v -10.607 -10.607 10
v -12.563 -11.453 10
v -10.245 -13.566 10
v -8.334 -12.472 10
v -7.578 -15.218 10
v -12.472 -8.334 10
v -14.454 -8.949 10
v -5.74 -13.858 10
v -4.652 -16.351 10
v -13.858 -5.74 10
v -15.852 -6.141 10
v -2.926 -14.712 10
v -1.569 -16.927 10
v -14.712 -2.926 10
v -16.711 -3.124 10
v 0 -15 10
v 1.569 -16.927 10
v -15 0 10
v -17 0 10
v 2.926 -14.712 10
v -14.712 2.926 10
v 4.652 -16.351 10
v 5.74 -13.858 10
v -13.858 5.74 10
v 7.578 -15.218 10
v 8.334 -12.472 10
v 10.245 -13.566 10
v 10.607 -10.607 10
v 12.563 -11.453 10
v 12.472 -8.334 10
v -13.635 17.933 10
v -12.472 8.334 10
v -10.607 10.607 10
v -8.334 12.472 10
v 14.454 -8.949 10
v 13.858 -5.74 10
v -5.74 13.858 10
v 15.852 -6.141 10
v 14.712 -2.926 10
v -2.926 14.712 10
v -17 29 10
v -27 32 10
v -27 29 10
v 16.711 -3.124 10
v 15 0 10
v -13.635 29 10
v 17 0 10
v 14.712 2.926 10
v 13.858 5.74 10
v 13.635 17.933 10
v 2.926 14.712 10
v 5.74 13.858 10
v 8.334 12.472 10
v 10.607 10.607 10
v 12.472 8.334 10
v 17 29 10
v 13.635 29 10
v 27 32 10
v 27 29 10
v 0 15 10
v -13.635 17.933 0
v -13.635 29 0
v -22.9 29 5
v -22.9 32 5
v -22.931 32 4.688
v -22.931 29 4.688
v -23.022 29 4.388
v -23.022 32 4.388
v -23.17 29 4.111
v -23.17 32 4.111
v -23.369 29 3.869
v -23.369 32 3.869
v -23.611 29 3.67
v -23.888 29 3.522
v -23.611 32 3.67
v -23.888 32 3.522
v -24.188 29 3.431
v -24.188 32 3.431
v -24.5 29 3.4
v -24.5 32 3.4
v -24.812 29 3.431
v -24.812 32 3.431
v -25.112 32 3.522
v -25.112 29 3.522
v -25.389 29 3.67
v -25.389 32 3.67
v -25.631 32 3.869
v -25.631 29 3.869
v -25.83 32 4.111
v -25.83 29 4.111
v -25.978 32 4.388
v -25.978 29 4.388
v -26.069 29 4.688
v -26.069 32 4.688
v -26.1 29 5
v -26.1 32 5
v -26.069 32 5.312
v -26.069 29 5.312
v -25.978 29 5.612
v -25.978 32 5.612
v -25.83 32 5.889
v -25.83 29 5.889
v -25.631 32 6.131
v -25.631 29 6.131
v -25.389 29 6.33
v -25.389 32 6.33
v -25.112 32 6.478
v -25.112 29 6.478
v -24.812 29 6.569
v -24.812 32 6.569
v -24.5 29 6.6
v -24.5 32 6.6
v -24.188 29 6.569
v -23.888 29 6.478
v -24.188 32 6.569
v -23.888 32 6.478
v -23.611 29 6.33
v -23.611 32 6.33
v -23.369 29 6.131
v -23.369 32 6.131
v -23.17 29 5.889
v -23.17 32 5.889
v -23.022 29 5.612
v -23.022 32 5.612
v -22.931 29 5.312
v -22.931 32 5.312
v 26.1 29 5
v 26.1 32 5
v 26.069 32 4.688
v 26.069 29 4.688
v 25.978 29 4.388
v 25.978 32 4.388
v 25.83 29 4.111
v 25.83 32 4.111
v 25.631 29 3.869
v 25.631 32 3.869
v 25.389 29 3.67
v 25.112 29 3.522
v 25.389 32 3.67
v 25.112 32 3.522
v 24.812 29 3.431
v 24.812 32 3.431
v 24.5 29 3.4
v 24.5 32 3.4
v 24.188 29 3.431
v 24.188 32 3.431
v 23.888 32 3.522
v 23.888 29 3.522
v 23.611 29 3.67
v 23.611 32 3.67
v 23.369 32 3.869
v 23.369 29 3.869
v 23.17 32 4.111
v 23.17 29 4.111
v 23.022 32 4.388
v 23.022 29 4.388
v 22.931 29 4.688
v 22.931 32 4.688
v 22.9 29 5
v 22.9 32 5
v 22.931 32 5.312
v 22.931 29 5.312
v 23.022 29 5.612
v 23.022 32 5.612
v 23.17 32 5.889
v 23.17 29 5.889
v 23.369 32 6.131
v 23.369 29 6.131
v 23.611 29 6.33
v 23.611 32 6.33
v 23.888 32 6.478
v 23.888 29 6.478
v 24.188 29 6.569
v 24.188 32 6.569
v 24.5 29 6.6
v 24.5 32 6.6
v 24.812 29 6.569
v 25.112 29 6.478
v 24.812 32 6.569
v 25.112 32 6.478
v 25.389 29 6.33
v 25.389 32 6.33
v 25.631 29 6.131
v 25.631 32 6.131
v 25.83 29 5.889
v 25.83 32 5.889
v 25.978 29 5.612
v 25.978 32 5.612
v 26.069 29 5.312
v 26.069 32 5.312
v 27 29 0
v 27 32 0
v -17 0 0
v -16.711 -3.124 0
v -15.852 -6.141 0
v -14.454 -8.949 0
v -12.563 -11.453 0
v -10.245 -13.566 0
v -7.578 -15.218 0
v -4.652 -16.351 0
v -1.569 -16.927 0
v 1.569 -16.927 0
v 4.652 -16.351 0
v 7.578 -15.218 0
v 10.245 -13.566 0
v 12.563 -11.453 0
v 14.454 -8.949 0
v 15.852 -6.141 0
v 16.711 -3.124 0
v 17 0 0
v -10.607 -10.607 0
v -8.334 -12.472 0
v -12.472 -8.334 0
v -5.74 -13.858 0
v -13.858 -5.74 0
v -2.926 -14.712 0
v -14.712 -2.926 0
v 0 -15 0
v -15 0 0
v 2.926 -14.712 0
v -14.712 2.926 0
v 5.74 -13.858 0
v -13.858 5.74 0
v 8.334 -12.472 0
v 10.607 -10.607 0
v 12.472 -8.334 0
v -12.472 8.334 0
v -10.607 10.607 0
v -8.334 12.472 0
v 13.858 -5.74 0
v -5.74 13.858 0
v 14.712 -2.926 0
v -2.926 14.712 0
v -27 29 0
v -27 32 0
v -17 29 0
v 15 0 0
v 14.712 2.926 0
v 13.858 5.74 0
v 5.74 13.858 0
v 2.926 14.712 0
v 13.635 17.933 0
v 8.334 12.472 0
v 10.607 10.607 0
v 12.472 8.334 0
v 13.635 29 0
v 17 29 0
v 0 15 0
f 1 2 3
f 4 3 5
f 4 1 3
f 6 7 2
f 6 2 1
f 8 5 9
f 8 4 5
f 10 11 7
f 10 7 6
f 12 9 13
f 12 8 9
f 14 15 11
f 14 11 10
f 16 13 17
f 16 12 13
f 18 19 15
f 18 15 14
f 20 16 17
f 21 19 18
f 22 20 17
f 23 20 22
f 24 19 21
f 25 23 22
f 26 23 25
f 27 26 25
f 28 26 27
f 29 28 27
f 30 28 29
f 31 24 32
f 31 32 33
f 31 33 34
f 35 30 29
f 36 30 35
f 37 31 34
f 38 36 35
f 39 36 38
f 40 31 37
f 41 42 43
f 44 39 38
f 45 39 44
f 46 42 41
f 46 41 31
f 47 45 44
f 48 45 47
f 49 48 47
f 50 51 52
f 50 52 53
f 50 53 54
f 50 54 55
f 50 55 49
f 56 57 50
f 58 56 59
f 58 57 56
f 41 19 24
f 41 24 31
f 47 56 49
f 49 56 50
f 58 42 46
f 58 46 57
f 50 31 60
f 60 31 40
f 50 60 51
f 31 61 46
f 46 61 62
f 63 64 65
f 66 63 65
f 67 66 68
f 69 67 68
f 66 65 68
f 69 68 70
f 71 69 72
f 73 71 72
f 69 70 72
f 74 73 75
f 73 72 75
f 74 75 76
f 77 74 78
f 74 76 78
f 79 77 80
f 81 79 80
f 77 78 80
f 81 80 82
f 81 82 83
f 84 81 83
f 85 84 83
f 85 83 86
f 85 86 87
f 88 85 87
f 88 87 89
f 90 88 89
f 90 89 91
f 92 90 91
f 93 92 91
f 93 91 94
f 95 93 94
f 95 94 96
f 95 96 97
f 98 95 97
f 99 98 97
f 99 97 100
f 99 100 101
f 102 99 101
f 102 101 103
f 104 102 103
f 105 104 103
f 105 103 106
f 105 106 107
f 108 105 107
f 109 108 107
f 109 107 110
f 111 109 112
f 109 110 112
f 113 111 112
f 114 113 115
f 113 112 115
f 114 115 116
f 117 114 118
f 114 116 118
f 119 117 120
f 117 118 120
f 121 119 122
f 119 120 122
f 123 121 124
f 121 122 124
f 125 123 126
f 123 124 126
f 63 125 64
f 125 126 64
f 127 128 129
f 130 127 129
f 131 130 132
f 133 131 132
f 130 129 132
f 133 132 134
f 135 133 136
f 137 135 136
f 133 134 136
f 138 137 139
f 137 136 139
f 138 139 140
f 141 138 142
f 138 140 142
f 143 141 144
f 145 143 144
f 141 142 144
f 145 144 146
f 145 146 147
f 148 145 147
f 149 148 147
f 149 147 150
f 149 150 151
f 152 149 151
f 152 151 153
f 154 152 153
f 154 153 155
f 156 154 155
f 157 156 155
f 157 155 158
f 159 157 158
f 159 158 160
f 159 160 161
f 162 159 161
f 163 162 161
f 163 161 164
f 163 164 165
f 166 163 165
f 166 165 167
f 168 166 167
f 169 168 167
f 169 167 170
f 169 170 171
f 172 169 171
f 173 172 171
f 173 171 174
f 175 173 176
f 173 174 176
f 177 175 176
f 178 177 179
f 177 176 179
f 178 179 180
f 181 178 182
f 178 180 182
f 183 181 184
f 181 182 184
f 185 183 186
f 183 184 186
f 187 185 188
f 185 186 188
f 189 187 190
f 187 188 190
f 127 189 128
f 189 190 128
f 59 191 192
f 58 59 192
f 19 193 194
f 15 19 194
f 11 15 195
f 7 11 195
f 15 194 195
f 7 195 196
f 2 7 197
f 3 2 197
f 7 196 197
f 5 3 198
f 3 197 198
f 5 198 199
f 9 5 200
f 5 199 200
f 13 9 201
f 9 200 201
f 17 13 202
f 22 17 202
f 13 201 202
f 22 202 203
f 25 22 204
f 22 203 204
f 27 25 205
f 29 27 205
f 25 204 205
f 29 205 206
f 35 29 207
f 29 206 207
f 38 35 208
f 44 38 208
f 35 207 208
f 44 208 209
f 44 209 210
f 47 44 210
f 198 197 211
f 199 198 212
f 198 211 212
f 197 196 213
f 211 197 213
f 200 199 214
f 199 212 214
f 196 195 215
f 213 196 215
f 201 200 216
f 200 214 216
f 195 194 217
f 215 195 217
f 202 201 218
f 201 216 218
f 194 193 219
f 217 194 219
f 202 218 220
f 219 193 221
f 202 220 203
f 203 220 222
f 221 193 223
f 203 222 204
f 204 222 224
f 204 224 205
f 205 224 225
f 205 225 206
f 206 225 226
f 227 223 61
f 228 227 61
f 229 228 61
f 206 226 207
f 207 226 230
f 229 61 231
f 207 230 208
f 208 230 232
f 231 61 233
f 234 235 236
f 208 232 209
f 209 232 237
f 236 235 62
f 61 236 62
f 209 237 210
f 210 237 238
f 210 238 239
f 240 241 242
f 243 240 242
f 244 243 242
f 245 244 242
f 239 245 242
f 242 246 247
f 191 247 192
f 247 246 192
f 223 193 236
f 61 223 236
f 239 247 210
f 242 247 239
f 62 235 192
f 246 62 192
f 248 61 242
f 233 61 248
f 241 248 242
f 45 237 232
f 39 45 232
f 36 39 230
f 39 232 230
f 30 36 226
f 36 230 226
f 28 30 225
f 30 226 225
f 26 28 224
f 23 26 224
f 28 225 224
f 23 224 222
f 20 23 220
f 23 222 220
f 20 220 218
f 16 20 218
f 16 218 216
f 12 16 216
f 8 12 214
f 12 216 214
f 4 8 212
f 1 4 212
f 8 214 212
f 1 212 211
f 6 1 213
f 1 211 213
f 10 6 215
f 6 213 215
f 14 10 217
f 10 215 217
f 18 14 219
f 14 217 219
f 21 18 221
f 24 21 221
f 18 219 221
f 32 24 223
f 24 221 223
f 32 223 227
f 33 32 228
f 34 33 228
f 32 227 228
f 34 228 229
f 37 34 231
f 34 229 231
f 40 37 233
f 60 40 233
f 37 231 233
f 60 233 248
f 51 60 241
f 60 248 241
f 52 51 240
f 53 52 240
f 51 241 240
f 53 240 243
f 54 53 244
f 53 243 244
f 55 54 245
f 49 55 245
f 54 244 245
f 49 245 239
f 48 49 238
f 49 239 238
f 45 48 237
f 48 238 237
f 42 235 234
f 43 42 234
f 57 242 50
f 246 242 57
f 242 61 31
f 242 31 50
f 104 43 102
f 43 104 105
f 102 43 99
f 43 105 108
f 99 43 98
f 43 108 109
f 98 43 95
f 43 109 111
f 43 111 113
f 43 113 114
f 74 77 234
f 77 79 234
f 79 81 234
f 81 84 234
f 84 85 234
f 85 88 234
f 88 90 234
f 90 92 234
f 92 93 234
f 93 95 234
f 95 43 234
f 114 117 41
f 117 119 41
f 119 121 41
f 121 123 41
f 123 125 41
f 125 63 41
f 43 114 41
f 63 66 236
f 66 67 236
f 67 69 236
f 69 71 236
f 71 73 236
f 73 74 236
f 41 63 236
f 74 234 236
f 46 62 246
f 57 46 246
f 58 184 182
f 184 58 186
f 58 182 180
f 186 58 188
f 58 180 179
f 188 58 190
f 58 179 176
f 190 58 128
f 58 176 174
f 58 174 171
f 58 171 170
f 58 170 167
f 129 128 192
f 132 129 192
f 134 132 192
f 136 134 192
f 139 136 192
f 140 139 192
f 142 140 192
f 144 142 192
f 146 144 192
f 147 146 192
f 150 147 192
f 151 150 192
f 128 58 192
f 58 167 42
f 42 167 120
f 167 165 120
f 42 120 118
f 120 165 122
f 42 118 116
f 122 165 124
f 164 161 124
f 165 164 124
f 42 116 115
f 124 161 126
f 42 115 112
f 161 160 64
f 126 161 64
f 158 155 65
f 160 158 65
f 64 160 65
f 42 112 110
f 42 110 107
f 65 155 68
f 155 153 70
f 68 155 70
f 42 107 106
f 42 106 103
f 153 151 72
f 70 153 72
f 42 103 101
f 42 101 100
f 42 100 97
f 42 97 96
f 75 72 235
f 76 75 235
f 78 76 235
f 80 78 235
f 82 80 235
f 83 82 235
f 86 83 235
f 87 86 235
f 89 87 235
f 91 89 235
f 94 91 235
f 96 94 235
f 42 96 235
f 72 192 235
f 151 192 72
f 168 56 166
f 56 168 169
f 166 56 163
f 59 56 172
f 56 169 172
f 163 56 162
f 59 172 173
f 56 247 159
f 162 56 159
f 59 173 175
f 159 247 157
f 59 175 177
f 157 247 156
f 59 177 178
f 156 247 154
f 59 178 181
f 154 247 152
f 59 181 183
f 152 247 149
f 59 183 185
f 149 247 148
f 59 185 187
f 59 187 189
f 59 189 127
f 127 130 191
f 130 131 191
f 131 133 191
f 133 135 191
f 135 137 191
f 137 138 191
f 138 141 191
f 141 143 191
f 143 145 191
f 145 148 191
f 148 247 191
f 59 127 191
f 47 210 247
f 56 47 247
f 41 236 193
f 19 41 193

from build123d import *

# Parameters (mm, degrees)
F0_W     = 27.270341292
F0_H     = 11.066971153
F1_DEPTH = 10
F3_DEPTH = 49.001


with BuildPart() as f1:
    # F0 (on Top) → F1 (new body)
    with BuildSketch(Plane.XY):
        with BuildLine():
            ThreePointArc((-17, 0), (0, 17), (17, 0))
            Line((17, 0), (17, 29))
            Line((17, 29), (27, 29))
            Line((27, 29), (27, 32))
            Line((27, 32), (17, 32))
            Line((17, 32), (-17, 32))
            Line((-17, 32), (-27, 32))
            Line((-27, 32), (-27, 29))
            Line((-27, 29), (-17, 29))
            Line((-17, 29), (-17, 0))
        make_face()
        with Locations((0, 23.4665144235)):
            Rectangle(F0_W, F0_H, mode=Mode.SUBTRACT)
        with BuildLine():
            Line((17, 0), (15, 0))
            ThreePointArc((15, 0), (0, -15), (-15, 0))
            Line((-15, 0), (-17, 0))
            ThreePointArc((-17, 0), (0, -17), (17, 0))
        make_face()
        with BuildLine():
            ThreePointArc((-15, 0), (0, 15), (15, 0))
            Line((15, 0), (17, 0))
            ThreePointArc((17, 0), (0, 17), (-17, 0))
            Line((-17, 0), (-15, 0))
        make_face()
    extrude(amount=F1_DEPTH)

    # F2 (on face) → F3 (cut, through all)
    with BuildSketch(Plane(origin=(0, 32, 0), x_dir=(-1, 0, 0), z_dir=(0, 1, 0))):
        with BuildLine():
            Line((-26.1, 5), (-22.9, 5))
            ThreePointArc((-22.9, 5), (-24.5, 6.6), (-26.1, 5))
        make_face()
        with BuildLine():
            ThreePointArc((-26.1, 5), (-24.5, 3.4), (-22.9, 5))
            Line((-22.9, 5), (-26.1, 5))
        make_face()
        with BuildLine():
            Line((22.9, 5), (26.1, 5))
            ThreePointArc((26.1, 5), (24.5, 6.6), (22.9, 5))
        make_face()
        with BuildLine():
            ThreePointArc((22.9, 5), (24.5, 3.4), (26.1, 5))
            Line((26.1, 5), (22.9, 5))
        make_face()
    extrude(amount=-F3_DEPTH, mode=Mode.SUBTRACT)


solid = f1.part
